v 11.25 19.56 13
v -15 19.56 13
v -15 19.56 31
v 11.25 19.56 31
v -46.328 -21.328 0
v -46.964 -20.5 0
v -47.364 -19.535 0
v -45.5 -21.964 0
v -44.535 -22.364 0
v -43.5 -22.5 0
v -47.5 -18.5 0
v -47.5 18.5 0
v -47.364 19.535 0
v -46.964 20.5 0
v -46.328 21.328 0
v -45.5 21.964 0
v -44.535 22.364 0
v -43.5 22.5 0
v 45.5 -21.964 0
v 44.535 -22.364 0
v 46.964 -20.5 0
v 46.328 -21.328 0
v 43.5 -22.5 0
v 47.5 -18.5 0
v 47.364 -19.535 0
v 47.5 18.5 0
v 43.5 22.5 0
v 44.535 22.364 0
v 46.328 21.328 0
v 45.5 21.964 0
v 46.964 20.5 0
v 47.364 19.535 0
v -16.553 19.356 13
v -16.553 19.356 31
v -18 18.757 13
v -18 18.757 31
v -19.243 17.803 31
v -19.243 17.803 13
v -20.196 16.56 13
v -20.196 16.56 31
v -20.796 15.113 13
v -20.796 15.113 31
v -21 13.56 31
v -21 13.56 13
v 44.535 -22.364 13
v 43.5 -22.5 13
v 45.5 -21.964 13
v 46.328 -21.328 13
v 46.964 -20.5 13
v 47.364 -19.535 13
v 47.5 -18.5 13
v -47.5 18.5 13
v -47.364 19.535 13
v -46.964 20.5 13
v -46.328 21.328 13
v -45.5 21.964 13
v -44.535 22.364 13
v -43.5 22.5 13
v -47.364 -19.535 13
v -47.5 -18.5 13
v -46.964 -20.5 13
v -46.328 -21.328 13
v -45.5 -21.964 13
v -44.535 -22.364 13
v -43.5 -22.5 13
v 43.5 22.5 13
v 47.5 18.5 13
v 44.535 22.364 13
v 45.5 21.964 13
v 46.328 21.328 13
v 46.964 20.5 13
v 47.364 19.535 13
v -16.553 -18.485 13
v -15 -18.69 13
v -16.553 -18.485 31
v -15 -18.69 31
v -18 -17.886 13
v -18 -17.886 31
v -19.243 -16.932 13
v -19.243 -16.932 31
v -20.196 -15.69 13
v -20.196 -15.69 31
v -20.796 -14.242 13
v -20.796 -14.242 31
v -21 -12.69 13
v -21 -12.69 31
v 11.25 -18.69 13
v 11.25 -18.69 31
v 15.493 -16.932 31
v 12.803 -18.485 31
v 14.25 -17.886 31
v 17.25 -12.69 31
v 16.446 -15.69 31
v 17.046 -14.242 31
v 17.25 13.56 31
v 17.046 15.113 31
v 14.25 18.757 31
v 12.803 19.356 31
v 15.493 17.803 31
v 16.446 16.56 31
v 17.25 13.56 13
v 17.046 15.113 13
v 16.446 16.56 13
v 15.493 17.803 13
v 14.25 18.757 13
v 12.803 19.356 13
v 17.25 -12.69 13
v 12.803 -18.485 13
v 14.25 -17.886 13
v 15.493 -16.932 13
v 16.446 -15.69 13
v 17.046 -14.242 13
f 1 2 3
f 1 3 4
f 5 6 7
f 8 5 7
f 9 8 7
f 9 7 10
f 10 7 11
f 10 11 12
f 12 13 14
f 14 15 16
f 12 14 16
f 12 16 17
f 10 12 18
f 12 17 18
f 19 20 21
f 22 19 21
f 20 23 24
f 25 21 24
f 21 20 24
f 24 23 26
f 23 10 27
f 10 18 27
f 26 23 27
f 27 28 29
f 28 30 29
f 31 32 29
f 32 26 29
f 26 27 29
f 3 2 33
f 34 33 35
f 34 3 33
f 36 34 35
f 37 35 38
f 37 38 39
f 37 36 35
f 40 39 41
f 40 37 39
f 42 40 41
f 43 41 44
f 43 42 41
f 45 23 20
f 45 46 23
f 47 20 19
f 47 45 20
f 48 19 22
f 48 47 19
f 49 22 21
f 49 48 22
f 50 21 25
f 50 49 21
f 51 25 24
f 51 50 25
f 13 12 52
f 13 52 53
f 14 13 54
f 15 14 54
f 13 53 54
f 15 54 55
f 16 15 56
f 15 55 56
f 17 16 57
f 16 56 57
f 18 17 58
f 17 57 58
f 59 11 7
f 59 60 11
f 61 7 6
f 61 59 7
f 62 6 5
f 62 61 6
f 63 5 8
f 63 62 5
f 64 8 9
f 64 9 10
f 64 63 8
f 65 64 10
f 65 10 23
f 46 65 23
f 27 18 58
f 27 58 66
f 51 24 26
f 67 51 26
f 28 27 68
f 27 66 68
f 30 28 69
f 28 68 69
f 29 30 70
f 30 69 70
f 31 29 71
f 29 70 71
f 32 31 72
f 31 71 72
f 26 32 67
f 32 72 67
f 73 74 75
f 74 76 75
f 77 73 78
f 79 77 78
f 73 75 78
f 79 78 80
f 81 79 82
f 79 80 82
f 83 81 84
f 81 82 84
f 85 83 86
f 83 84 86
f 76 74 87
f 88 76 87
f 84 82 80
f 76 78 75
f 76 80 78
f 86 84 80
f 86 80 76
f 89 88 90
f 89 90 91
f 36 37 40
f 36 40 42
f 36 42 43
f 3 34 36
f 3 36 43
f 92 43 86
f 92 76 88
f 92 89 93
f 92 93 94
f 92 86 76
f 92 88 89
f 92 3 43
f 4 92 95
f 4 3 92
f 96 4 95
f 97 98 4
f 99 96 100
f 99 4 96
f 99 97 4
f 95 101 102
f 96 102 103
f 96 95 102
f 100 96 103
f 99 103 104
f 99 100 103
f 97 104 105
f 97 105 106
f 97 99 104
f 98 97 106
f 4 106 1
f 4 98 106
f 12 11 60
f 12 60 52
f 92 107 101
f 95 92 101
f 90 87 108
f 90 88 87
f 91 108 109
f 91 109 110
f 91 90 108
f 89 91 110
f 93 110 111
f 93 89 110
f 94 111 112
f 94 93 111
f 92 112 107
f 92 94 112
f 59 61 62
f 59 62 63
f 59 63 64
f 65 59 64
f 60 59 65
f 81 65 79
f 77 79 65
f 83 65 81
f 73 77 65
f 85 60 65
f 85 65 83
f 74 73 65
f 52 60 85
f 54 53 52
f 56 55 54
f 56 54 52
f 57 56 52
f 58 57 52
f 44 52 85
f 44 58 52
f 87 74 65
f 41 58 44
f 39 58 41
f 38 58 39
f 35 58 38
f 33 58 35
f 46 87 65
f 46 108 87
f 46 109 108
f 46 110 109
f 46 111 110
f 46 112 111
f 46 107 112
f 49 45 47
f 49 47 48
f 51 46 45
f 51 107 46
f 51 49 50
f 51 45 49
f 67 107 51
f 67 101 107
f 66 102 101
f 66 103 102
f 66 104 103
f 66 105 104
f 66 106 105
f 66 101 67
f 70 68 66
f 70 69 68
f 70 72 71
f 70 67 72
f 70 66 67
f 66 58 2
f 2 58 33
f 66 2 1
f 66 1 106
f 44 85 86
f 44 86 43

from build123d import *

# Parameters (mm, degrees)
F0_W     = 38.25
F0_H     = 38.25
F1_DEPTH = 31
F0_W_2   = 95
F0_H_2   = 45
F2_DEPTH = 13
F3_R     = 6
F4_R     = 4


with BuildPart() as f1:
    # F0 (on Top) → F1 (new body)
    with BuildSketch(Plane.XY):
        with Locations((-1.875, 0.435483)):
            Rectangle(F0_W, F0_H)
    extrude(amount=F1_DEPTH)

    # F0 (on Top) → F2 (join)
    with BuildSketch(Plane.XY):
        Rectangle(F0_W_2, F0_H_2)
        with Locations((-1.875, 0.435483)):
            Rectangle(F0_W, F0_H, mode=Mode.SUBTRACT)
    extrude(amount=F2_DEPTH)

    # F3
    f3_edges = [f1.edges().sort_by_distance(p)[0] for p in [
        (-21, 19.560483, 22),
        (-21, -18.689517, 22),
        (17.25, -18.689517, 22),
        (17.25, 19.560483, 22),
    ]]
    fillet(f3_edges, radius=F3_R)

    # F4
    f4_edges = [f1.edges().sort_by_distance(p)[0] for p in [
        (47.5, -22.5, 6.5),
        (47.5, 22.5, 6.5),
        (-47.5, -22.5, 6.5),
        (-47.5, 22.5, 6.5),
    ]]
    fillet(f4_edges, radius=F4_R)


solid = f1.part
